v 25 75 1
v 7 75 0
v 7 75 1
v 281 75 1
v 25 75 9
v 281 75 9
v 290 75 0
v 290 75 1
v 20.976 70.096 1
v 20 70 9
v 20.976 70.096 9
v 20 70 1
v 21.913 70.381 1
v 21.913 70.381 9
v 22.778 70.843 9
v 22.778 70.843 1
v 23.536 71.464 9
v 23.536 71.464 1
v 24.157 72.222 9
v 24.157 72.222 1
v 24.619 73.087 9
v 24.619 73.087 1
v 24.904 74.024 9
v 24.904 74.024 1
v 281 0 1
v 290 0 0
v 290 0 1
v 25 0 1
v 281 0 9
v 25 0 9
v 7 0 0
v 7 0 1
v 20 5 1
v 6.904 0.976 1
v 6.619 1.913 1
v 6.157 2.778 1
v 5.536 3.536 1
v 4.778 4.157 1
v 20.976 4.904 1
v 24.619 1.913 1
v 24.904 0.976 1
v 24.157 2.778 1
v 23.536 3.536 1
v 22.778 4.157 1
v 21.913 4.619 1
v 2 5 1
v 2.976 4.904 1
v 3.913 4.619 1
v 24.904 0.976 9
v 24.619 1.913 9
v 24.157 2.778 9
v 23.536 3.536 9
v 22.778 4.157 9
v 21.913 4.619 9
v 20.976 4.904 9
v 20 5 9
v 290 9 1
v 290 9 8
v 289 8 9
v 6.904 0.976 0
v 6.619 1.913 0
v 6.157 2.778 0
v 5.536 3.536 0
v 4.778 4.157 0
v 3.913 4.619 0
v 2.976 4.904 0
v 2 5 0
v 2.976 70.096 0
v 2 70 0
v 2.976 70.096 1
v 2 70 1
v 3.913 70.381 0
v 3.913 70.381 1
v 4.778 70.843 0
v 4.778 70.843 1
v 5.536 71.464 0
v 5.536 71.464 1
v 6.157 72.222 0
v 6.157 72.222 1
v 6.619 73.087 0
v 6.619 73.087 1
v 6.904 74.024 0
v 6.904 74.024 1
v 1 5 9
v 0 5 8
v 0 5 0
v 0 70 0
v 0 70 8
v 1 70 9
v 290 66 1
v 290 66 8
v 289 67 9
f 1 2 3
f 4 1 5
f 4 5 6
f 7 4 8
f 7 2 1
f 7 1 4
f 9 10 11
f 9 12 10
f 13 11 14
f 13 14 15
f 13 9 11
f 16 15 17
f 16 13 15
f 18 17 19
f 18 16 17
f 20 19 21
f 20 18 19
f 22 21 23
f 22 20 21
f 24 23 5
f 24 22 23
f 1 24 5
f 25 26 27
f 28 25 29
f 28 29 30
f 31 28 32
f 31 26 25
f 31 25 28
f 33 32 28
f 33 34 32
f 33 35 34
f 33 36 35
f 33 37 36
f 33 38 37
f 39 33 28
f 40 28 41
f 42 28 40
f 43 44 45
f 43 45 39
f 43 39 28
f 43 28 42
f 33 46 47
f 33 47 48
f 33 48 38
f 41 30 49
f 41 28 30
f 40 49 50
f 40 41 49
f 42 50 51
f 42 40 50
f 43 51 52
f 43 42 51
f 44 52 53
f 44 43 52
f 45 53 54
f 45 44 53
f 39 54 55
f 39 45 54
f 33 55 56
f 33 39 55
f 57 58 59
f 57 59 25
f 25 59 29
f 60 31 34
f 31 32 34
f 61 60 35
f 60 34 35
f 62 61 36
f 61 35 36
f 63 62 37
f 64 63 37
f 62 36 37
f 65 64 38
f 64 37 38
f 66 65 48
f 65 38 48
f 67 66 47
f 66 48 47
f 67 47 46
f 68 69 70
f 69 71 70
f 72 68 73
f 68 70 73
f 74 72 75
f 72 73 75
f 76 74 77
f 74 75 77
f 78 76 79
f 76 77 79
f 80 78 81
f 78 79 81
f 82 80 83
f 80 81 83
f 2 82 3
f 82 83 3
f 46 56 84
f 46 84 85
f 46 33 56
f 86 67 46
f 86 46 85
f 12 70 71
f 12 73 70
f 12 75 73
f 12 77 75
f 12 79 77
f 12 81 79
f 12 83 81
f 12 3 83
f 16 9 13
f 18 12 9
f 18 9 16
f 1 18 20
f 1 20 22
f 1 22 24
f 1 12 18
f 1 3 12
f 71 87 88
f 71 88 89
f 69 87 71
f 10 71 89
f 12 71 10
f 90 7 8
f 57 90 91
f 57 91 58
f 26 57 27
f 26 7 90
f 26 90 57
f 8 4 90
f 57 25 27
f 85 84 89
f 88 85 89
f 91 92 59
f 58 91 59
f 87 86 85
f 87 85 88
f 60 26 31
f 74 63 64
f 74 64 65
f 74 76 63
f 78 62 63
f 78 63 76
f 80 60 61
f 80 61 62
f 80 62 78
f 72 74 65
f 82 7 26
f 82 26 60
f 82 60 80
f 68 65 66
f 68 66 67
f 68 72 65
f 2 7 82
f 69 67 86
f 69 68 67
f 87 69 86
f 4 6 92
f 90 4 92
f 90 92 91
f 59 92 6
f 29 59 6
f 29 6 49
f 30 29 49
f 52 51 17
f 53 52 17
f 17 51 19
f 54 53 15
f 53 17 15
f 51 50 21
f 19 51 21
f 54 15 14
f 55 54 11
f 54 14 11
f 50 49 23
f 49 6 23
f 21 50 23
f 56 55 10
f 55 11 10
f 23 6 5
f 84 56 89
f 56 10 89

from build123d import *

# Parameters (mm, degrees)
BASE_EXTRUDE_DEPTH = 9
SKETCH2_W          = 25
SKETCH2_H          = 5
CUT_EXTRUDE1_DEPTH = 8
CHAMFER1_SIZE      = 1
FILLET1_R          = 5


with BuildPart() as part:
    # Sketch1 → Base-Extrude (new body)
    with BuildSketch(Plane.XY):
        Polygon((7, 0), (7, 5), (0, 5), (0, 70), (7, 70), (7, 75), (290, 75), (290, 0), align=None)
    extrude(amount=BASE_EXTRUDE_DEPTH)

    # Sketch2 → Cut-Extrude1 (cut)
    with BuildSketch(Plane.XY.offset(9)):
        Polygon((281, 75), (290, 66), (290, 75), align=None)
        Polygon((290, 9), (281, 0), (290, 0), align=None)
        with Locations((12.5, 72.5)):
            Rectangle(SKETCH2_W, SKETCH2_H)
        with Locations((12.5, 2.5)):
            Rectangle(SKETCH2_W, SKETCH2_H)
    extrude(amount=-CUT_EXTRUDE1_DEPTH, mode=Mode.SUBTRACT)

    # Chamfer1
    chamfer1_edges = [part.edges().sort_by_distance(p)[0] for p in [
        (0, 37.5, 9),
        (290, 37.5, 9),
    ]]
    chamfer(chamfer1_edges, length=CHAMFER1_SIZE)

    # Fillet1
    fillet1_edges = [part.edges().sort_by_distance(p)[0] for p in [
        (7, 5, 0.5),
        (25, 5, 5),
        (7, 70, 0.5),
        (25, 70, 5),
    ]]
    fillet(fillet1_edges, radius=FILLET1_R - 0.0001)  # a hair under: the kernel refuses the full size


solid = part.part
